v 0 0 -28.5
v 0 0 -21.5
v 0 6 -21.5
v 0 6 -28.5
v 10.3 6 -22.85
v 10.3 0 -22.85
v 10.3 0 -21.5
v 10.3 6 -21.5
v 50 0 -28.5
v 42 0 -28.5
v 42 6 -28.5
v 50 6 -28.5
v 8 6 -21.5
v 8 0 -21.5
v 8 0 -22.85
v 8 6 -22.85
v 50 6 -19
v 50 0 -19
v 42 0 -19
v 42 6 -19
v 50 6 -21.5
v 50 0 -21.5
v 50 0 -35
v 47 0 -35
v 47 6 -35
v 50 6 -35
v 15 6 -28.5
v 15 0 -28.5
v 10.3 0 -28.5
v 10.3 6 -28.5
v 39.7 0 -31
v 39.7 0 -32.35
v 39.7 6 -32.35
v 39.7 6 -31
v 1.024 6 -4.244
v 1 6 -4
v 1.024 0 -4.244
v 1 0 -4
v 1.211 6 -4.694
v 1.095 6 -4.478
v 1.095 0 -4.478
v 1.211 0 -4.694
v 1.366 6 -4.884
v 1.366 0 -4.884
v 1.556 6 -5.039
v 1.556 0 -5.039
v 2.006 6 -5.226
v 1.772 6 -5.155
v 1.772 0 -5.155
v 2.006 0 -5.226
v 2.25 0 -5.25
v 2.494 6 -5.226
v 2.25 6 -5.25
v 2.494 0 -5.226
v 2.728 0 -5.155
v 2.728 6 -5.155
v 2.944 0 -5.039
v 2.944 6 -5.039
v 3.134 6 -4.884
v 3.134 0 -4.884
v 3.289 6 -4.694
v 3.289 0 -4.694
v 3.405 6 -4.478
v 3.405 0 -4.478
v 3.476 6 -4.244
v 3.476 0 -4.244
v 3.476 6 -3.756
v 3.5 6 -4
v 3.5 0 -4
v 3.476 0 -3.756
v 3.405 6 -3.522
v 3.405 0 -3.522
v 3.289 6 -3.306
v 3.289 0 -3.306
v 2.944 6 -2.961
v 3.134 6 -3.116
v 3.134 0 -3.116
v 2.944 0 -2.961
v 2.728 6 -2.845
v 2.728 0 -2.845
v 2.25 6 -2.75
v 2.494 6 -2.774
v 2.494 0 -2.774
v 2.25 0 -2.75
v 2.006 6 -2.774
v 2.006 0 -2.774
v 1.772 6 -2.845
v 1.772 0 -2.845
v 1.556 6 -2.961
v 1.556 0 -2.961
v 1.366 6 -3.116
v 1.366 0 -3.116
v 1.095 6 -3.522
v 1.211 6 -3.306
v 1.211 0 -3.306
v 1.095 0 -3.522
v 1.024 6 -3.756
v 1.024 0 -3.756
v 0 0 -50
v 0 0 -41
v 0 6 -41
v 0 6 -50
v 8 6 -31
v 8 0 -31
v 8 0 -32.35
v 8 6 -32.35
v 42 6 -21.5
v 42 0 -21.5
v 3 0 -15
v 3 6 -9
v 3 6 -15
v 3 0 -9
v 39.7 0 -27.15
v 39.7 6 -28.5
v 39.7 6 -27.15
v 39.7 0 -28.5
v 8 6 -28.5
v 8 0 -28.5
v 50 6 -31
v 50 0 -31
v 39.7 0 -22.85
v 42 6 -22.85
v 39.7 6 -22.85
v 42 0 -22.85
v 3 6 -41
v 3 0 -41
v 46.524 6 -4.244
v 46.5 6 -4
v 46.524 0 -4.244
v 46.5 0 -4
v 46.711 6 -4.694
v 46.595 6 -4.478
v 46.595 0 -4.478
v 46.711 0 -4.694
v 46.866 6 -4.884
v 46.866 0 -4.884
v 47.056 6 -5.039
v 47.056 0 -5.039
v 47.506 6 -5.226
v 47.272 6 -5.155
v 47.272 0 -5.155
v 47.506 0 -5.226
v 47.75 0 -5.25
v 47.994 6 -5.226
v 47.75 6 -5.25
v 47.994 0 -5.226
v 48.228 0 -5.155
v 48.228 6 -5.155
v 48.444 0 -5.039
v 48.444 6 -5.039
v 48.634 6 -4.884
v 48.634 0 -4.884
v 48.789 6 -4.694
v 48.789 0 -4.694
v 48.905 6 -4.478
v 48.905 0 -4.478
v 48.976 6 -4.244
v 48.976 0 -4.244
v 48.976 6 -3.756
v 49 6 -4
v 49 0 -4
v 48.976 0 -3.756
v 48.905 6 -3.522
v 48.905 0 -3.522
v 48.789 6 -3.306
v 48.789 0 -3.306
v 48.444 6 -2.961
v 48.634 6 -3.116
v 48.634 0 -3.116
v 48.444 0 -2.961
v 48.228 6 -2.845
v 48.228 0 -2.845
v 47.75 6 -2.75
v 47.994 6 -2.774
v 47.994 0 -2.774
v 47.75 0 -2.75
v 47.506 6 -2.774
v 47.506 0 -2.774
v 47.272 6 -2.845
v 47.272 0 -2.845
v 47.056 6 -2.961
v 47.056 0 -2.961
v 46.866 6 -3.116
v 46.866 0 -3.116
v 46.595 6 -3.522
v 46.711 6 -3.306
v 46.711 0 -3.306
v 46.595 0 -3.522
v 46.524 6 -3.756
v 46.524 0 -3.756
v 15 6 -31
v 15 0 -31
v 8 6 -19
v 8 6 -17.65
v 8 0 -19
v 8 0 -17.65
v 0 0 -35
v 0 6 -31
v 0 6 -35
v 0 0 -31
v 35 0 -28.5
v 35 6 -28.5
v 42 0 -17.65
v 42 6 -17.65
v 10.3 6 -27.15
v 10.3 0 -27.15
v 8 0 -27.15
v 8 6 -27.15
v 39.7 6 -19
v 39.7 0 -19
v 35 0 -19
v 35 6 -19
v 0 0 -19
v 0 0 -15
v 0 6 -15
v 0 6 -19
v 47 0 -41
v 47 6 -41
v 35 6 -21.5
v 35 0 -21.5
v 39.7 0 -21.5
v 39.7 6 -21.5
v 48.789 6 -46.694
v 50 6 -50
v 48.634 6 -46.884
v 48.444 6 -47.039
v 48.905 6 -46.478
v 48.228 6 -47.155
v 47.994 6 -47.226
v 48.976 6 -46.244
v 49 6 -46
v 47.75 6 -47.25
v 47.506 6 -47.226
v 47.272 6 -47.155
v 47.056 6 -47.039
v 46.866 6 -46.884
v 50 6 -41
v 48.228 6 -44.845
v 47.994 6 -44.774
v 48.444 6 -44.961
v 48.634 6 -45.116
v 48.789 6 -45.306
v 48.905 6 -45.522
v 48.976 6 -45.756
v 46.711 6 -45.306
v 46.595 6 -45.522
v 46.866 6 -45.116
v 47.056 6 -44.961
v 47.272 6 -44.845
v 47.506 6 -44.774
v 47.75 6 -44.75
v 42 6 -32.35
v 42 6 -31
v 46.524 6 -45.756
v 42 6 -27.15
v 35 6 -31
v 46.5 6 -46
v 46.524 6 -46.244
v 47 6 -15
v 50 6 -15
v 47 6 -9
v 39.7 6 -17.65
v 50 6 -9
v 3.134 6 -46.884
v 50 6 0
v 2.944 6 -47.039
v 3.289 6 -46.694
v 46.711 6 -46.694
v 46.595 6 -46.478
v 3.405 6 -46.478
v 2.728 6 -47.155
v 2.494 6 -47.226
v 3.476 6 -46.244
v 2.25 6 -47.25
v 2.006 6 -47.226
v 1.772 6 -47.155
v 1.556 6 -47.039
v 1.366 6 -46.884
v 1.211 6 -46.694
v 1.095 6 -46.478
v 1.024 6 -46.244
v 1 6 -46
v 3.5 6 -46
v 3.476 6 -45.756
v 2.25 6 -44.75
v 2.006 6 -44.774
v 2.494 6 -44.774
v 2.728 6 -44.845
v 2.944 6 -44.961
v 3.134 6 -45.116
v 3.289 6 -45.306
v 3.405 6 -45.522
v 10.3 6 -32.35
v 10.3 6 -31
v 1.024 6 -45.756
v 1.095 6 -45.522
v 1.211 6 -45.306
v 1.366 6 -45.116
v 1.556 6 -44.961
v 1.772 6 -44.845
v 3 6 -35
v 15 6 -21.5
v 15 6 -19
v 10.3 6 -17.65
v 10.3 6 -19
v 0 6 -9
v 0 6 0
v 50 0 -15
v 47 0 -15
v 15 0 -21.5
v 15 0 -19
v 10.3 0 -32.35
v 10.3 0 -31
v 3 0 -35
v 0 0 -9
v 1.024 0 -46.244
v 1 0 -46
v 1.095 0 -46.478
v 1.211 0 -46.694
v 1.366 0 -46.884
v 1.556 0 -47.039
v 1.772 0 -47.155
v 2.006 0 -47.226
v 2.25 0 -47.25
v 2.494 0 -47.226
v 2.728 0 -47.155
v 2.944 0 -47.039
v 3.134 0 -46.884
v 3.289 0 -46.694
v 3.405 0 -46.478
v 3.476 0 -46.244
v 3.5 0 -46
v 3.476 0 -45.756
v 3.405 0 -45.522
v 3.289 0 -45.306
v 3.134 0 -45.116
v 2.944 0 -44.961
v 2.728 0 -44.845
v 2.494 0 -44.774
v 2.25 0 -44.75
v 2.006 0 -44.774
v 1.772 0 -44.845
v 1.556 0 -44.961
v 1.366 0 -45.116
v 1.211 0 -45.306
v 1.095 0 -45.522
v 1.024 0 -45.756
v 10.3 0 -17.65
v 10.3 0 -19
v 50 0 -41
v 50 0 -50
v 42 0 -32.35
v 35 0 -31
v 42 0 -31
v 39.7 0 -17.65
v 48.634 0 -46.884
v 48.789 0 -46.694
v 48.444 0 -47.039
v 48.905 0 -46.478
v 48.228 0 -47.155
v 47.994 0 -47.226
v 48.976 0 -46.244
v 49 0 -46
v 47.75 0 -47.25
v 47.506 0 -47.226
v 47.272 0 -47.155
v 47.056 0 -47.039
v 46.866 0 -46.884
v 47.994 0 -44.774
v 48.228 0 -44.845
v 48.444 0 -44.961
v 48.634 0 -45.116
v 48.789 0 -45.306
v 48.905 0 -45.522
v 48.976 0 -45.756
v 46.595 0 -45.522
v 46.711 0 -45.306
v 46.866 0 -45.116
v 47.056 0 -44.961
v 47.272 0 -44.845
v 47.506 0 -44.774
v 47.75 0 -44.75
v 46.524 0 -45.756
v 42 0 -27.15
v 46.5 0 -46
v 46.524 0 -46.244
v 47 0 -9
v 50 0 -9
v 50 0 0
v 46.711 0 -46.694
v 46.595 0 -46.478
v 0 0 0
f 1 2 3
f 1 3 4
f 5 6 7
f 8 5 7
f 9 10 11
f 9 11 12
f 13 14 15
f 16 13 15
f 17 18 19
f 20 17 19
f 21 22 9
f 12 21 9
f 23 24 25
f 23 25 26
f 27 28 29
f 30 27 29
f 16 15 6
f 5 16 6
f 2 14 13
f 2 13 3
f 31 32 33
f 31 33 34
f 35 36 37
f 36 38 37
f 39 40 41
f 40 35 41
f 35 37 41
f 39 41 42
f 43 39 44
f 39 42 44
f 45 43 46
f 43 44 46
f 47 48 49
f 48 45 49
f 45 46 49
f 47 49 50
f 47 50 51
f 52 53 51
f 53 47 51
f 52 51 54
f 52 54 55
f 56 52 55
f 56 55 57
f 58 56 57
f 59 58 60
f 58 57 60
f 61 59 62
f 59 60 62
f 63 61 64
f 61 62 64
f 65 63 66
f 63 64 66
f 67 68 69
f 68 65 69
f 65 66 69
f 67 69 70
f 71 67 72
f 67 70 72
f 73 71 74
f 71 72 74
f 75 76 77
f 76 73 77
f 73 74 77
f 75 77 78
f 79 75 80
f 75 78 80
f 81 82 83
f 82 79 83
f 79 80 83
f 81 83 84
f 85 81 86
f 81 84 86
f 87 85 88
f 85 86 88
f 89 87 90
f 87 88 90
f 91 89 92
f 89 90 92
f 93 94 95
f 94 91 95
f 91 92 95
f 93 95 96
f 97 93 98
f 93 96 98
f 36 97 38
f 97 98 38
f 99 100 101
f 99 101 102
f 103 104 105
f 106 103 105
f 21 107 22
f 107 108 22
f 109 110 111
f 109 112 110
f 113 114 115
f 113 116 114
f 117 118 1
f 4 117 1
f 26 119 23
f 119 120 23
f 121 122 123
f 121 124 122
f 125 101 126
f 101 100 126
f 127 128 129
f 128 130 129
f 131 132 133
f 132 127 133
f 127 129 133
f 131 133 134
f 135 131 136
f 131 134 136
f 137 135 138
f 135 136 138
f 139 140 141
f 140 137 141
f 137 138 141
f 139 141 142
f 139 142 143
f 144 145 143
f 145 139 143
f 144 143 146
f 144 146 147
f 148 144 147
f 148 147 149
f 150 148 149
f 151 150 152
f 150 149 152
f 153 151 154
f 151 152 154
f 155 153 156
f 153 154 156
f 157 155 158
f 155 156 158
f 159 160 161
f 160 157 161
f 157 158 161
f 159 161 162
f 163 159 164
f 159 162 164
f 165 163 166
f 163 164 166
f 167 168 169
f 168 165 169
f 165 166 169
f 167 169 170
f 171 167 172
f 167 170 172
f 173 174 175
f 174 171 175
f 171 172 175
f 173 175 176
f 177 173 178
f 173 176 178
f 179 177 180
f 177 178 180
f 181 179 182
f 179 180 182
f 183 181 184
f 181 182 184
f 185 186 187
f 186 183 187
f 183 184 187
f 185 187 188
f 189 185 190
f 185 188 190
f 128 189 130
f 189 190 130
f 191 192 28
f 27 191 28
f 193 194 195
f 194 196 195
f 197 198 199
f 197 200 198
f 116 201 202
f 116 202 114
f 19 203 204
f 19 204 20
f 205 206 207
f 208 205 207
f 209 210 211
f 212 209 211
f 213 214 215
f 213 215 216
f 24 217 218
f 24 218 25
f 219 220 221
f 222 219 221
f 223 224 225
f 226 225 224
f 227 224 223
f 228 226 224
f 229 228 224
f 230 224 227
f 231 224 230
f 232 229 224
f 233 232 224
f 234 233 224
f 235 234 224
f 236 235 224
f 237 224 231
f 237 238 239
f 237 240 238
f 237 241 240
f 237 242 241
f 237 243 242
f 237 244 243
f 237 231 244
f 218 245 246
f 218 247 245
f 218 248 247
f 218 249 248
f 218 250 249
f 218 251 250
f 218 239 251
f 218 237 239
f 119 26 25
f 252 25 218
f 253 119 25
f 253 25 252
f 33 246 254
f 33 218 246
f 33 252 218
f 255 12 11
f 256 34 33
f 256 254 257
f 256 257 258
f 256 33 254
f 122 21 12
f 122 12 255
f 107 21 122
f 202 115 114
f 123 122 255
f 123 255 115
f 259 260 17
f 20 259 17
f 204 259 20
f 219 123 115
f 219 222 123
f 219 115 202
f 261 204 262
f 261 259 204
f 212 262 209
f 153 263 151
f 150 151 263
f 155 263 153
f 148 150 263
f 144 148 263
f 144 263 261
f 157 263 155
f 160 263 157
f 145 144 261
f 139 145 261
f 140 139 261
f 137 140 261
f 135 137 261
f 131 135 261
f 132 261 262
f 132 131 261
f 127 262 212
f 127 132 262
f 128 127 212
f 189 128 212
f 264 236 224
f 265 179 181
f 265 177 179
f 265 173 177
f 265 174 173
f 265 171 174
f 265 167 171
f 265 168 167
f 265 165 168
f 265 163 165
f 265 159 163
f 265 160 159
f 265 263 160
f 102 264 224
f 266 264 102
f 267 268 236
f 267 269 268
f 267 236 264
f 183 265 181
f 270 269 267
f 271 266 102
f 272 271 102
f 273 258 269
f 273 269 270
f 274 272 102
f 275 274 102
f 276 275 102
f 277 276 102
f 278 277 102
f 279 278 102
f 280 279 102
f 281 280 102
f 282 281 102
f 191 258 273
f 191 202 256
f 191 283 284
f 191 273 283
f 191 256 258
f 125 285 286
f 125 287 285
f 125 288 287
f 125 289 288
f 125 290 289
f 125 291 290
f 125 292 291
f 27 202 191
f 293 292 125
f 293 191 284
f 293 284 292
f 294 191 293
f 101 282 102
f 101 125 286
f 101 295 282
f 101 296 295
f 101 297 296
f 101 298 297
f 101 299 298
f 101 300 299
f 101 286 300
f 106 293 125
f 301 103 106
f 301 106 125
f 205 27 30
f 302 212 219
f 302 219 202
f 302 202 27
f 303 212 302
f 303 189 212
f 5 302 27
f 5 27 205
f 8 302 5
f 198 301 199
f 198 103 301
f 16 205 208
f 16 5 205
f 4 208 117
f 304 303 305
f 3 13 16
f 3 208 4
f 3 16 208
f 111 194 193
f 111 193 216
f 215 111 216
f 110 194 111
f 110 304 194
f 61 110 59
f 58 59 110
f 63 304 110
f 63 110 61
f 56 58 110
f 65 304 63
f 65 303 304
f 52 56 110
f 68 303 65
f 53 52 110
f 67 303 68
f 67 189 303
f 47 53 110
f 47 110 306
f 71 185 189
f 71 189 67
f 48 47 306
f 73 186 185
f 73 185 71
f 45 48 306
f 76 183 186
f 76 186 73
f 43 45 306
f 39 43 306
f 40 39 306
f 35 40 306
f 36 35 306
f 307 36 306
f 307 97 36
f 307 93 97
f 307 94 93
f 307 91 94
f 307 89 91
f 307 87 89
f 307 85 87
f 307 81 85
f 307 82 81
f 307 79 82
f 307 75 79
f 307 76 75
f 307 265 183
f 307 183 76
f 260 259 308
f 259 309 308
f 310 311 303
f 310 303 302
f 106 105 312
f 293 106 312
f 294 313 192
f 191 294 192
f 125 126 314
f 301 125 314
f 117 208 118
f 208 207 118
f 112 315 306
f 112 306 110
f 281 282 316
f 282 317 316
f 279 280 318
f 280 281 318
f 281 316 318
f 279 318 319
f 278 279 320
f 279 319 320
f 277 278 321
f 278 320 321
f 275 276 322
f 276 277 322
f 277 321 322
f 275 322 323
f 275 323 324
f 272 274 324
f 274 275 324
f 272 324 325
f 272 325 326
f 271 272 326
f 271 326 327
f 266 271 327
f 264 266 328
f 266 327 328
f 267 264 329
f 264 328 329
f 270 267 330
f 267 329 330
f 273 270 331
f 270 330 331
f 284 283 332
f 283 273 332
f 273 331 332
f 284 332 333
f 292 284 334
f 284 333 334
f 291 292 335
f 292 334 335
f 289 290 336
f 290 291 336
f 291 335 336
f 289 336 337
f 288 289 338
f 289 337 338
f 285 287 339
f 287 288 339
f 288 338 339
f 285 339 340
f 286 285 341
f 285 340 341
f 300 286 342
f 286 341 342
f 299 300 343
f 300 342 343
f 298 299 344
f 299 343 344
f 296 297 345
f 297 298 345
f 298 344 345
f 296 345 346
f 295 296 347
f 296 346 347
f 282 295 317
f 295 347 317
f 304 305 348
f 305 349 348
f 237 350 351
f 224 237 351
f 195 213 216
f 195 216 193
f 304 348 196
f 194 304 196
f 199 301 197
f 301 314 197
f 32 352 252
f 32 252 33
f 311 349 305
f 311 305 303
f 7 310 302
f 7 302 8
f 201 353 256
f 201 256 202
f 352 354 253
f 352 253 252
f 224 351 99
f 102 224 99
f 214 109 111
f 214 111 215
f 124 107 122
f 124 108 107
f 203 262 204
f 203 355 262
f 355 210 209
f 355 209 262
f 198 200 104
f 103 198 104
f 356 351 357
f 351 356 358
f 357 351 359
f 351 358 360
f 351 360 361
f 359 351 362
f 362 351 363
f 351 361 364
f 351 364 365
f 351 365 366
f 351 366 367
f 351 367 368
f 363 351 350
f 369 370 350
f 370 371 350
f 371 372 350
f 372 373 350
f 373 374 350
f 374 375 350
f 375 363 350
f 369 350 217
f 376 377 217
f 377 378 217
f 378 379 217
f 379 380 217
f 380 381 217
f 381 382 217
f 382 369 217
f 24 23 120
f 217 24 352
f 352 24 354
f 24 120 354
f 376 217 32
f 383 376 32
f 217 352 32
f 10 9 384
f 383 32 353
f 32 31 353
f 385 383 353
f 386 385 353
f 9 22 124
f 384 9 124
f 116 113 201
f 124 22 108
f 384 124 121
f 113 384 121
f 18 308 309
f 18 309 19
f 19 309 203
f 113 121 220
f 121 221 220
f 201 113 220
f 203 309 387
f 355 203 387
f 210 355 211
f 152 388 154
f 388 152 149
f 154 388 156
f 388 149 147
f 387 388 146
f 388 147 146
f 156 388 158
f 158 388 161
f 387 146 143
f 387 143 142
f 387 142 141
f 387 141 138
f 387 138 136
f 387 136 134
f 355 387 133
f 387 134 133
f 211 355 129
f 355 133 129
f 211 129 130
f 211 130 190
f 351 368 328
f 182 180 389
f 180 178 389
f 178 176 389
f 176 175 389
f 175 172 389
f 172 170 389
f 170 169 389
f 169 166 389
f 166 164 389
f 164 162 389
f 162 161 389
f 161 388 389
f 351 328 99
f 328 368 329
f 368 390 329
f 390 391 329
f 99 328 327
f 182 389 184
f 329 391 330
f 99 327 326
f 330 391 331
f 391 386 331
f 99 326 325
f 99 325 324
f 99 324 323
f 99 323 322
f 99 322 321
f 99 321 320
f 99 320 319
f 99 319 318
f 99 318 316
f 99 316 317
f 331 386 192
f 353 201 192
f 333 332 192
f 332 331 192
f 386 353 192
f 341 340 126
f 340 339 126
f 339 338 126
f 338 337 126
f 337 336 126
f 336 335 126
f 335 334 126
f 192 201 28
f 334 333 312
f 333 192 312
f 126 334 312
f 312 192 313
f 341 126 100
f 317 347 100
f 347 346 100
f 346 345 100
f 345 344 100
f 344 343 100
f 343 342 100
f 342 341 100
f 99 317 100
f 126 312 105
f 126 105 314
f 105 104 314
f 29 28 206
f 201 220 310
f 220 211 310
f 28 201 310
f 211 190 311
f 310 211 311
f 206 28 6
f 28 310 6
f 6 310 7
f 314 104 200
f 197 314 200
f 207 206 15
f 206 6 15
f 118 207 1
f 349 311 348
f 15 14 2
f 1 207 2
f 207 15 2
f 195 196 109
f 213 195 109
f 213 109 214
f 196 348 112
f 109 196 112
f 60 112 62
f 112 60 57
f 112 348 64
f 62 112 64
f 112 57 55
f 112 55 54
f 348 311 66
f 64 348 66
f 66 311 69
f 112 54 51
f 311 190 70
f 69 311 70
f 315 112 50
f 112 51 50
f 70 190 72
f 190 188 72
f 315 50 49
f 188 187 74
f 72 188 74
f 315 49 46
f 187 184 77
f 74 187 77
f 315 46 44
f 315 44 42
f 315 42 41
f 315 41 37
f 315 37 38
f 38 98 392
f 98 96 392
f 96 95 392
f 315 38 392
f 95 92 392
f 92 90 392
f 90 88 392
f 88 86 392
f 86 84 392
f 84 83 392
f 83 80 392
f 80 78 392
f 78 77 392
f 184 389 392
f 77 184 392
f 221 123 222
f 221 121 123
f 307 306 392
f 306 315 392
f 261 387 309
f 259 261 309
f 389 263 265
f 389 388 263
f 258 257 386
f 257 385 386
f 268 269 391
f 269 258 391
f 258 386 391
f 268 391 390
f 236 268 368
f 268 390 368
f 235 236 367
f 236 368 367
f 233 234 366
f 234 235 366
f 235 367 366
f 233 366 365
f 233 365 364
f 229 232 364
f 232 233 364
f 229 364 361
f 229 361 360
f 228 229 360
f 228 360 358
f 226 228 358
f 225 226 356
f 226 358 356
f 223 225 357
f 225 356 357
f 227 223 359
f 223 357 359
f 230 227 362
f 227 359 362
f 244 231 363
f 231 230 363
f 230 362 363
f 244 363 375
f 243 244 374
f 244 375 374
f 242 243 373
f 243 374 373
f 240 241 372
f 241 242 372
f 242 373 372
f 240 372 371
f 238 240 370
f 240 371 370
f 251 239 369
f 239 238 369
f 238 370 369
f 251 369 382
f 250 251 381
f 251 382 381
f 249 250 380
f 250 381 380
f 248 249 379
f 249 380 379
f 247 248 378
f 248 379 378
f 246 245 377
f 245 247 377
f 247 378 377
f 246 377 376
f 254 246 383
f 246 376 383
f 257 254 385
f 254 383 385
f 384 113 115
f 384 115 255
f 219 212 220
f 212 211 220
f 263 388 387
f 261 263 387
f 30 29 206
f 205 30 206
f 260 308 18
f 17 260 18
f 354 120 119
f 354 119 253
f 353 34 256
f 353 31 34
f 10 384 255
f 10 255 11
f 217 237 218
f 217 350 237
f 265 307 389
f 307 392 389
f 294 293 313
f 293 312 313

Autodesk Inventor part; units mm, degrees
ref_plane "YZ Plane" through (0, 0, 0) normal (1, 0, 0) x (0, 1, 0)
ref_plane "XZ Plane" through (0, 0, 0) normal (0, 1, 0) x (-1, 0, 0)
ref_plane "XY Plane" through (0, 0, 0) normal (0, 0, 1) x (1, 0, 0)
sketch "Sketch1" plane through (0, 0, 0) normal (0, 1, 0) x (-1, 0, 0)
  line L0 (0, 0) -> (-50, 0)
  line L1 (-50, -50) -> (0, -50)
  line L2 (-50, -41) -> (-47, -41)
  line L3 (-47, -41) -> (-47, -35)
  line L4 (-47, -35) -> (-50, -35)
  line L5 (-50, -35) -> (-50, -41) construction
  line L6 (-50, -9) -> (-47, -9)
  line L7 (-47, -9) -> (-47, -15)
  line L8 (-47, -15) -> (-50, -15)
  line L9 (-50, -15) -> (-50, -9) construction
  line L10 (-25, 0) -> (-25, -50) construction
  line L11 (-50, -9) -> (-50, 0)
  line L12 (-50, -15) -> (-50, -19)
  line L13 (-50, -41) -> (-50, -50)
  circle A0 centre (-47.75, -4) radius 1.25
  circle A1 centre (-47.75, -46) radius 1.25
  line L14 (-50, -31) -> (-42, -31)
  line L15 (-35, -31) -> (-35, -28.5)
  line L16 (-35, -28.5) -> (-39.7, -28.5)
  line L17 (-50, -19) -> (-42, -19)
  line L18 (-35, -19) -> (-35, -21.5)
  line L19 (-35, -21.5) -> (-39.7, -21.5)
  line L20 (-50, -31) -> (-50, -35)
  line L21 (-50, -28.5) -> (-50, -31) construction
  line L22 (-50, -21.5) -> (-50, -28.5)
  line L23 (-50, -19) -> (-50, -21.5) construction
  line L24 (-42, -32.35) -> (-39.7, -32.35)
  line L25 (-39.7, -32.35) -> (-39.7, -31)
  line L26 (-39.7, -27.15) -> (-42, -27.15)
  line L27 (-42, -27.15) -> (-42, -28.5)
  line L28 (-42, -31) -> (-42, -32.35)
  line L29 (-42, -28.5) -> (-42, -31) construction
  line L30 (-42, -22.85) -> (-39.7, -22.85)
  line L31 (-39.7, -22.85) -> (-39.7, -21.5)
  line L32 (-39.7, -17.65) -> (-42, -17.65)
  line L33 (-42, -17.65) -> (-42, -19)
  line L34 (-42, -21.5) -> (-42, -22.85)
  line L35 (-42, -19) -> (-42, -21.5) construction
  line L36 (-39.7, -28.5) -> (-39.7, -27.15)
  line L37 (-39.7, -31) -> (-39.7, -28.5) construction
  line L38 (-39.7, -21.5) -> (-39.7, -19) construction
  line L39 (-39.7, -19) -> (-39.7, -17.65)
  line L40 (-42, -31) -> (-39.7, -31) construction
  line L41 (-39.7, -31) -> (-35, -31)
  line L42 (-42, -28.5) -> (-50, -28.5)
  line L43 (-39.7, -28.5) -> (-42, -28.5) construction
  line L44 (-42, -21.5) -> (-50, -21.5)
  line L45 (-39.7, -21.5) -> (-42, -21.5) construction
  line L46 (-42, -19) -> (-39.7, -19) construction
  line L47 (-39.7, -19) -> (-35, -19)
  line L48 (0, -41) -> (-3, -41)
  line L49 (-3, -41) -> (-3, -35)
  line L50 (-3, -35) -> (0, -35)
  line L51 (0, -35) -> (0, -41) construction
  line L52 (0, -9) -> (-3, -9)
  line L53 (-3, -9) -> (-3, -15)
  line L54 (-3, -15) -> (0, -15)
  line L55 (0, -15) -> (0, -9) construction
  line L56 (0, -9) -> (0, 0)
  line L57 (0, -15) -> (0, -19)
  line L58 (0, -41) -> (0, -50)
  circle A2 centre (-2.25, -4) radius 1.25
  circle A3 centre (-2.25, -46) radius 1.25
  line L59 (0, -31) -> (-8, -31)
  line L60 (-15, -31) -> (-15, -28.5)
  line L61 (-15, -28.5) -> (-10.3, -28.5)
  line L62 (0, -19) -> (-8, -19)
  line L63 (-15, -19) -> (-15, -21.5)
  line L64 (-15, -21.5) -> (-10.3, -21.5)
  line L65 (0, -31) -> (0, -35)
  line L66 (0, -28.5) -> (0, -31) construction
  line L67 (0, -21.5) -> (0, -28.5)
  line L68 (0, -19) -> (0, -21.5) construction
  line L69 (-8, -32.35) -> (-10.3, -32.35)
  line L70 (-10.3, -32.35) -> (-10.3, -31)
  line L71 (-10.3, -27.15) -> (-8, -27.15)
  line L72 (-8, -27.15) -> (-8, -28.5)
  line L73 (-8, -31) -> (-8, -32.35)
  line L74 (-8, -28.5) -> (-8, -31) construction
  line L75 (-8, -22.85) -> (-10.3, -22.85)
  line L76 (-10.3, -22.85) -> (-10.3, -21.5)
  line L77 (-10.3, -17.65) -> (-8, -17.65)
  line L78 (-8, -17.65) -> (-8, -19)
  line L79 (-8, -21.5) -> (-8, -22.85)
  line L80 (-8, -19) -> (-8, -21.5) construction
  line L81 (-10.3, -28.5) -> (-10.3, -27.15)
  line L82 (-10.3, -31) -> (-10.3, -28.5) construction
  line L83 (-10.3, -21.5) -> (-10.3, -19) construction
  line L84 (-10.3, -19) -> (-10.3, -17.65)
  line L85 (-8, -31) -> (-10.3, -31) construction
  line L86 (-10.3, -31) -> (-15, -31)
  line L87 (-8, -28.5) -> (0, -28.5)
  line L88 (-10.3, -28.5) -> (-8, -28.5) construction
  line L89 (-8, -21.5) -> (0, -21.5)
  line L90 (-10.3, -21.5) -> (-8, -21.5) construction
  line L91 (-8, -19) -> (-10.3, -19) construction
  line L92 (-10.3, -19) -> (-15, -19)
  dimension "d0" = 50
  dimension "d1" = 50
  dimension "d20" = 3
  dimension "d21" = 6
  dimension "d22" = 6
  dimension "d26" = 20
  dimension "d27" = 2.5
  dimension "d28" = 2.25
  dimension "d30" = 2.5
  dimension "d31" = 2.25
  dimension "d32" = 5
  dimension "d33" = 15
  dimension "d34" = 2.5
  dimension "d35" = 15
  dimension "d36" = 2.5
  dimension "d37" = 4
  dimension "d38" = 5.2
  dimension "d39" = 2.3
  dimension "d40" = 8
  dimension "d41" = 2.3
  dimension "d42" = 5.2
  dimension "d43" = 8
  dimension "d44" = 5
extrude "Extrusion2" add sketch "Sketch1" along normal blind 6
equation "\"d22\" = d21"
equation "\"d30\" = d27"
equation "\"d31\" = d28"
equation "\"d33\" = d35"
equation "\"d34\" = d27"
equation "\"d36\" = d27"
equation "\"d43\" = d40"
properties part number "wall-front"
